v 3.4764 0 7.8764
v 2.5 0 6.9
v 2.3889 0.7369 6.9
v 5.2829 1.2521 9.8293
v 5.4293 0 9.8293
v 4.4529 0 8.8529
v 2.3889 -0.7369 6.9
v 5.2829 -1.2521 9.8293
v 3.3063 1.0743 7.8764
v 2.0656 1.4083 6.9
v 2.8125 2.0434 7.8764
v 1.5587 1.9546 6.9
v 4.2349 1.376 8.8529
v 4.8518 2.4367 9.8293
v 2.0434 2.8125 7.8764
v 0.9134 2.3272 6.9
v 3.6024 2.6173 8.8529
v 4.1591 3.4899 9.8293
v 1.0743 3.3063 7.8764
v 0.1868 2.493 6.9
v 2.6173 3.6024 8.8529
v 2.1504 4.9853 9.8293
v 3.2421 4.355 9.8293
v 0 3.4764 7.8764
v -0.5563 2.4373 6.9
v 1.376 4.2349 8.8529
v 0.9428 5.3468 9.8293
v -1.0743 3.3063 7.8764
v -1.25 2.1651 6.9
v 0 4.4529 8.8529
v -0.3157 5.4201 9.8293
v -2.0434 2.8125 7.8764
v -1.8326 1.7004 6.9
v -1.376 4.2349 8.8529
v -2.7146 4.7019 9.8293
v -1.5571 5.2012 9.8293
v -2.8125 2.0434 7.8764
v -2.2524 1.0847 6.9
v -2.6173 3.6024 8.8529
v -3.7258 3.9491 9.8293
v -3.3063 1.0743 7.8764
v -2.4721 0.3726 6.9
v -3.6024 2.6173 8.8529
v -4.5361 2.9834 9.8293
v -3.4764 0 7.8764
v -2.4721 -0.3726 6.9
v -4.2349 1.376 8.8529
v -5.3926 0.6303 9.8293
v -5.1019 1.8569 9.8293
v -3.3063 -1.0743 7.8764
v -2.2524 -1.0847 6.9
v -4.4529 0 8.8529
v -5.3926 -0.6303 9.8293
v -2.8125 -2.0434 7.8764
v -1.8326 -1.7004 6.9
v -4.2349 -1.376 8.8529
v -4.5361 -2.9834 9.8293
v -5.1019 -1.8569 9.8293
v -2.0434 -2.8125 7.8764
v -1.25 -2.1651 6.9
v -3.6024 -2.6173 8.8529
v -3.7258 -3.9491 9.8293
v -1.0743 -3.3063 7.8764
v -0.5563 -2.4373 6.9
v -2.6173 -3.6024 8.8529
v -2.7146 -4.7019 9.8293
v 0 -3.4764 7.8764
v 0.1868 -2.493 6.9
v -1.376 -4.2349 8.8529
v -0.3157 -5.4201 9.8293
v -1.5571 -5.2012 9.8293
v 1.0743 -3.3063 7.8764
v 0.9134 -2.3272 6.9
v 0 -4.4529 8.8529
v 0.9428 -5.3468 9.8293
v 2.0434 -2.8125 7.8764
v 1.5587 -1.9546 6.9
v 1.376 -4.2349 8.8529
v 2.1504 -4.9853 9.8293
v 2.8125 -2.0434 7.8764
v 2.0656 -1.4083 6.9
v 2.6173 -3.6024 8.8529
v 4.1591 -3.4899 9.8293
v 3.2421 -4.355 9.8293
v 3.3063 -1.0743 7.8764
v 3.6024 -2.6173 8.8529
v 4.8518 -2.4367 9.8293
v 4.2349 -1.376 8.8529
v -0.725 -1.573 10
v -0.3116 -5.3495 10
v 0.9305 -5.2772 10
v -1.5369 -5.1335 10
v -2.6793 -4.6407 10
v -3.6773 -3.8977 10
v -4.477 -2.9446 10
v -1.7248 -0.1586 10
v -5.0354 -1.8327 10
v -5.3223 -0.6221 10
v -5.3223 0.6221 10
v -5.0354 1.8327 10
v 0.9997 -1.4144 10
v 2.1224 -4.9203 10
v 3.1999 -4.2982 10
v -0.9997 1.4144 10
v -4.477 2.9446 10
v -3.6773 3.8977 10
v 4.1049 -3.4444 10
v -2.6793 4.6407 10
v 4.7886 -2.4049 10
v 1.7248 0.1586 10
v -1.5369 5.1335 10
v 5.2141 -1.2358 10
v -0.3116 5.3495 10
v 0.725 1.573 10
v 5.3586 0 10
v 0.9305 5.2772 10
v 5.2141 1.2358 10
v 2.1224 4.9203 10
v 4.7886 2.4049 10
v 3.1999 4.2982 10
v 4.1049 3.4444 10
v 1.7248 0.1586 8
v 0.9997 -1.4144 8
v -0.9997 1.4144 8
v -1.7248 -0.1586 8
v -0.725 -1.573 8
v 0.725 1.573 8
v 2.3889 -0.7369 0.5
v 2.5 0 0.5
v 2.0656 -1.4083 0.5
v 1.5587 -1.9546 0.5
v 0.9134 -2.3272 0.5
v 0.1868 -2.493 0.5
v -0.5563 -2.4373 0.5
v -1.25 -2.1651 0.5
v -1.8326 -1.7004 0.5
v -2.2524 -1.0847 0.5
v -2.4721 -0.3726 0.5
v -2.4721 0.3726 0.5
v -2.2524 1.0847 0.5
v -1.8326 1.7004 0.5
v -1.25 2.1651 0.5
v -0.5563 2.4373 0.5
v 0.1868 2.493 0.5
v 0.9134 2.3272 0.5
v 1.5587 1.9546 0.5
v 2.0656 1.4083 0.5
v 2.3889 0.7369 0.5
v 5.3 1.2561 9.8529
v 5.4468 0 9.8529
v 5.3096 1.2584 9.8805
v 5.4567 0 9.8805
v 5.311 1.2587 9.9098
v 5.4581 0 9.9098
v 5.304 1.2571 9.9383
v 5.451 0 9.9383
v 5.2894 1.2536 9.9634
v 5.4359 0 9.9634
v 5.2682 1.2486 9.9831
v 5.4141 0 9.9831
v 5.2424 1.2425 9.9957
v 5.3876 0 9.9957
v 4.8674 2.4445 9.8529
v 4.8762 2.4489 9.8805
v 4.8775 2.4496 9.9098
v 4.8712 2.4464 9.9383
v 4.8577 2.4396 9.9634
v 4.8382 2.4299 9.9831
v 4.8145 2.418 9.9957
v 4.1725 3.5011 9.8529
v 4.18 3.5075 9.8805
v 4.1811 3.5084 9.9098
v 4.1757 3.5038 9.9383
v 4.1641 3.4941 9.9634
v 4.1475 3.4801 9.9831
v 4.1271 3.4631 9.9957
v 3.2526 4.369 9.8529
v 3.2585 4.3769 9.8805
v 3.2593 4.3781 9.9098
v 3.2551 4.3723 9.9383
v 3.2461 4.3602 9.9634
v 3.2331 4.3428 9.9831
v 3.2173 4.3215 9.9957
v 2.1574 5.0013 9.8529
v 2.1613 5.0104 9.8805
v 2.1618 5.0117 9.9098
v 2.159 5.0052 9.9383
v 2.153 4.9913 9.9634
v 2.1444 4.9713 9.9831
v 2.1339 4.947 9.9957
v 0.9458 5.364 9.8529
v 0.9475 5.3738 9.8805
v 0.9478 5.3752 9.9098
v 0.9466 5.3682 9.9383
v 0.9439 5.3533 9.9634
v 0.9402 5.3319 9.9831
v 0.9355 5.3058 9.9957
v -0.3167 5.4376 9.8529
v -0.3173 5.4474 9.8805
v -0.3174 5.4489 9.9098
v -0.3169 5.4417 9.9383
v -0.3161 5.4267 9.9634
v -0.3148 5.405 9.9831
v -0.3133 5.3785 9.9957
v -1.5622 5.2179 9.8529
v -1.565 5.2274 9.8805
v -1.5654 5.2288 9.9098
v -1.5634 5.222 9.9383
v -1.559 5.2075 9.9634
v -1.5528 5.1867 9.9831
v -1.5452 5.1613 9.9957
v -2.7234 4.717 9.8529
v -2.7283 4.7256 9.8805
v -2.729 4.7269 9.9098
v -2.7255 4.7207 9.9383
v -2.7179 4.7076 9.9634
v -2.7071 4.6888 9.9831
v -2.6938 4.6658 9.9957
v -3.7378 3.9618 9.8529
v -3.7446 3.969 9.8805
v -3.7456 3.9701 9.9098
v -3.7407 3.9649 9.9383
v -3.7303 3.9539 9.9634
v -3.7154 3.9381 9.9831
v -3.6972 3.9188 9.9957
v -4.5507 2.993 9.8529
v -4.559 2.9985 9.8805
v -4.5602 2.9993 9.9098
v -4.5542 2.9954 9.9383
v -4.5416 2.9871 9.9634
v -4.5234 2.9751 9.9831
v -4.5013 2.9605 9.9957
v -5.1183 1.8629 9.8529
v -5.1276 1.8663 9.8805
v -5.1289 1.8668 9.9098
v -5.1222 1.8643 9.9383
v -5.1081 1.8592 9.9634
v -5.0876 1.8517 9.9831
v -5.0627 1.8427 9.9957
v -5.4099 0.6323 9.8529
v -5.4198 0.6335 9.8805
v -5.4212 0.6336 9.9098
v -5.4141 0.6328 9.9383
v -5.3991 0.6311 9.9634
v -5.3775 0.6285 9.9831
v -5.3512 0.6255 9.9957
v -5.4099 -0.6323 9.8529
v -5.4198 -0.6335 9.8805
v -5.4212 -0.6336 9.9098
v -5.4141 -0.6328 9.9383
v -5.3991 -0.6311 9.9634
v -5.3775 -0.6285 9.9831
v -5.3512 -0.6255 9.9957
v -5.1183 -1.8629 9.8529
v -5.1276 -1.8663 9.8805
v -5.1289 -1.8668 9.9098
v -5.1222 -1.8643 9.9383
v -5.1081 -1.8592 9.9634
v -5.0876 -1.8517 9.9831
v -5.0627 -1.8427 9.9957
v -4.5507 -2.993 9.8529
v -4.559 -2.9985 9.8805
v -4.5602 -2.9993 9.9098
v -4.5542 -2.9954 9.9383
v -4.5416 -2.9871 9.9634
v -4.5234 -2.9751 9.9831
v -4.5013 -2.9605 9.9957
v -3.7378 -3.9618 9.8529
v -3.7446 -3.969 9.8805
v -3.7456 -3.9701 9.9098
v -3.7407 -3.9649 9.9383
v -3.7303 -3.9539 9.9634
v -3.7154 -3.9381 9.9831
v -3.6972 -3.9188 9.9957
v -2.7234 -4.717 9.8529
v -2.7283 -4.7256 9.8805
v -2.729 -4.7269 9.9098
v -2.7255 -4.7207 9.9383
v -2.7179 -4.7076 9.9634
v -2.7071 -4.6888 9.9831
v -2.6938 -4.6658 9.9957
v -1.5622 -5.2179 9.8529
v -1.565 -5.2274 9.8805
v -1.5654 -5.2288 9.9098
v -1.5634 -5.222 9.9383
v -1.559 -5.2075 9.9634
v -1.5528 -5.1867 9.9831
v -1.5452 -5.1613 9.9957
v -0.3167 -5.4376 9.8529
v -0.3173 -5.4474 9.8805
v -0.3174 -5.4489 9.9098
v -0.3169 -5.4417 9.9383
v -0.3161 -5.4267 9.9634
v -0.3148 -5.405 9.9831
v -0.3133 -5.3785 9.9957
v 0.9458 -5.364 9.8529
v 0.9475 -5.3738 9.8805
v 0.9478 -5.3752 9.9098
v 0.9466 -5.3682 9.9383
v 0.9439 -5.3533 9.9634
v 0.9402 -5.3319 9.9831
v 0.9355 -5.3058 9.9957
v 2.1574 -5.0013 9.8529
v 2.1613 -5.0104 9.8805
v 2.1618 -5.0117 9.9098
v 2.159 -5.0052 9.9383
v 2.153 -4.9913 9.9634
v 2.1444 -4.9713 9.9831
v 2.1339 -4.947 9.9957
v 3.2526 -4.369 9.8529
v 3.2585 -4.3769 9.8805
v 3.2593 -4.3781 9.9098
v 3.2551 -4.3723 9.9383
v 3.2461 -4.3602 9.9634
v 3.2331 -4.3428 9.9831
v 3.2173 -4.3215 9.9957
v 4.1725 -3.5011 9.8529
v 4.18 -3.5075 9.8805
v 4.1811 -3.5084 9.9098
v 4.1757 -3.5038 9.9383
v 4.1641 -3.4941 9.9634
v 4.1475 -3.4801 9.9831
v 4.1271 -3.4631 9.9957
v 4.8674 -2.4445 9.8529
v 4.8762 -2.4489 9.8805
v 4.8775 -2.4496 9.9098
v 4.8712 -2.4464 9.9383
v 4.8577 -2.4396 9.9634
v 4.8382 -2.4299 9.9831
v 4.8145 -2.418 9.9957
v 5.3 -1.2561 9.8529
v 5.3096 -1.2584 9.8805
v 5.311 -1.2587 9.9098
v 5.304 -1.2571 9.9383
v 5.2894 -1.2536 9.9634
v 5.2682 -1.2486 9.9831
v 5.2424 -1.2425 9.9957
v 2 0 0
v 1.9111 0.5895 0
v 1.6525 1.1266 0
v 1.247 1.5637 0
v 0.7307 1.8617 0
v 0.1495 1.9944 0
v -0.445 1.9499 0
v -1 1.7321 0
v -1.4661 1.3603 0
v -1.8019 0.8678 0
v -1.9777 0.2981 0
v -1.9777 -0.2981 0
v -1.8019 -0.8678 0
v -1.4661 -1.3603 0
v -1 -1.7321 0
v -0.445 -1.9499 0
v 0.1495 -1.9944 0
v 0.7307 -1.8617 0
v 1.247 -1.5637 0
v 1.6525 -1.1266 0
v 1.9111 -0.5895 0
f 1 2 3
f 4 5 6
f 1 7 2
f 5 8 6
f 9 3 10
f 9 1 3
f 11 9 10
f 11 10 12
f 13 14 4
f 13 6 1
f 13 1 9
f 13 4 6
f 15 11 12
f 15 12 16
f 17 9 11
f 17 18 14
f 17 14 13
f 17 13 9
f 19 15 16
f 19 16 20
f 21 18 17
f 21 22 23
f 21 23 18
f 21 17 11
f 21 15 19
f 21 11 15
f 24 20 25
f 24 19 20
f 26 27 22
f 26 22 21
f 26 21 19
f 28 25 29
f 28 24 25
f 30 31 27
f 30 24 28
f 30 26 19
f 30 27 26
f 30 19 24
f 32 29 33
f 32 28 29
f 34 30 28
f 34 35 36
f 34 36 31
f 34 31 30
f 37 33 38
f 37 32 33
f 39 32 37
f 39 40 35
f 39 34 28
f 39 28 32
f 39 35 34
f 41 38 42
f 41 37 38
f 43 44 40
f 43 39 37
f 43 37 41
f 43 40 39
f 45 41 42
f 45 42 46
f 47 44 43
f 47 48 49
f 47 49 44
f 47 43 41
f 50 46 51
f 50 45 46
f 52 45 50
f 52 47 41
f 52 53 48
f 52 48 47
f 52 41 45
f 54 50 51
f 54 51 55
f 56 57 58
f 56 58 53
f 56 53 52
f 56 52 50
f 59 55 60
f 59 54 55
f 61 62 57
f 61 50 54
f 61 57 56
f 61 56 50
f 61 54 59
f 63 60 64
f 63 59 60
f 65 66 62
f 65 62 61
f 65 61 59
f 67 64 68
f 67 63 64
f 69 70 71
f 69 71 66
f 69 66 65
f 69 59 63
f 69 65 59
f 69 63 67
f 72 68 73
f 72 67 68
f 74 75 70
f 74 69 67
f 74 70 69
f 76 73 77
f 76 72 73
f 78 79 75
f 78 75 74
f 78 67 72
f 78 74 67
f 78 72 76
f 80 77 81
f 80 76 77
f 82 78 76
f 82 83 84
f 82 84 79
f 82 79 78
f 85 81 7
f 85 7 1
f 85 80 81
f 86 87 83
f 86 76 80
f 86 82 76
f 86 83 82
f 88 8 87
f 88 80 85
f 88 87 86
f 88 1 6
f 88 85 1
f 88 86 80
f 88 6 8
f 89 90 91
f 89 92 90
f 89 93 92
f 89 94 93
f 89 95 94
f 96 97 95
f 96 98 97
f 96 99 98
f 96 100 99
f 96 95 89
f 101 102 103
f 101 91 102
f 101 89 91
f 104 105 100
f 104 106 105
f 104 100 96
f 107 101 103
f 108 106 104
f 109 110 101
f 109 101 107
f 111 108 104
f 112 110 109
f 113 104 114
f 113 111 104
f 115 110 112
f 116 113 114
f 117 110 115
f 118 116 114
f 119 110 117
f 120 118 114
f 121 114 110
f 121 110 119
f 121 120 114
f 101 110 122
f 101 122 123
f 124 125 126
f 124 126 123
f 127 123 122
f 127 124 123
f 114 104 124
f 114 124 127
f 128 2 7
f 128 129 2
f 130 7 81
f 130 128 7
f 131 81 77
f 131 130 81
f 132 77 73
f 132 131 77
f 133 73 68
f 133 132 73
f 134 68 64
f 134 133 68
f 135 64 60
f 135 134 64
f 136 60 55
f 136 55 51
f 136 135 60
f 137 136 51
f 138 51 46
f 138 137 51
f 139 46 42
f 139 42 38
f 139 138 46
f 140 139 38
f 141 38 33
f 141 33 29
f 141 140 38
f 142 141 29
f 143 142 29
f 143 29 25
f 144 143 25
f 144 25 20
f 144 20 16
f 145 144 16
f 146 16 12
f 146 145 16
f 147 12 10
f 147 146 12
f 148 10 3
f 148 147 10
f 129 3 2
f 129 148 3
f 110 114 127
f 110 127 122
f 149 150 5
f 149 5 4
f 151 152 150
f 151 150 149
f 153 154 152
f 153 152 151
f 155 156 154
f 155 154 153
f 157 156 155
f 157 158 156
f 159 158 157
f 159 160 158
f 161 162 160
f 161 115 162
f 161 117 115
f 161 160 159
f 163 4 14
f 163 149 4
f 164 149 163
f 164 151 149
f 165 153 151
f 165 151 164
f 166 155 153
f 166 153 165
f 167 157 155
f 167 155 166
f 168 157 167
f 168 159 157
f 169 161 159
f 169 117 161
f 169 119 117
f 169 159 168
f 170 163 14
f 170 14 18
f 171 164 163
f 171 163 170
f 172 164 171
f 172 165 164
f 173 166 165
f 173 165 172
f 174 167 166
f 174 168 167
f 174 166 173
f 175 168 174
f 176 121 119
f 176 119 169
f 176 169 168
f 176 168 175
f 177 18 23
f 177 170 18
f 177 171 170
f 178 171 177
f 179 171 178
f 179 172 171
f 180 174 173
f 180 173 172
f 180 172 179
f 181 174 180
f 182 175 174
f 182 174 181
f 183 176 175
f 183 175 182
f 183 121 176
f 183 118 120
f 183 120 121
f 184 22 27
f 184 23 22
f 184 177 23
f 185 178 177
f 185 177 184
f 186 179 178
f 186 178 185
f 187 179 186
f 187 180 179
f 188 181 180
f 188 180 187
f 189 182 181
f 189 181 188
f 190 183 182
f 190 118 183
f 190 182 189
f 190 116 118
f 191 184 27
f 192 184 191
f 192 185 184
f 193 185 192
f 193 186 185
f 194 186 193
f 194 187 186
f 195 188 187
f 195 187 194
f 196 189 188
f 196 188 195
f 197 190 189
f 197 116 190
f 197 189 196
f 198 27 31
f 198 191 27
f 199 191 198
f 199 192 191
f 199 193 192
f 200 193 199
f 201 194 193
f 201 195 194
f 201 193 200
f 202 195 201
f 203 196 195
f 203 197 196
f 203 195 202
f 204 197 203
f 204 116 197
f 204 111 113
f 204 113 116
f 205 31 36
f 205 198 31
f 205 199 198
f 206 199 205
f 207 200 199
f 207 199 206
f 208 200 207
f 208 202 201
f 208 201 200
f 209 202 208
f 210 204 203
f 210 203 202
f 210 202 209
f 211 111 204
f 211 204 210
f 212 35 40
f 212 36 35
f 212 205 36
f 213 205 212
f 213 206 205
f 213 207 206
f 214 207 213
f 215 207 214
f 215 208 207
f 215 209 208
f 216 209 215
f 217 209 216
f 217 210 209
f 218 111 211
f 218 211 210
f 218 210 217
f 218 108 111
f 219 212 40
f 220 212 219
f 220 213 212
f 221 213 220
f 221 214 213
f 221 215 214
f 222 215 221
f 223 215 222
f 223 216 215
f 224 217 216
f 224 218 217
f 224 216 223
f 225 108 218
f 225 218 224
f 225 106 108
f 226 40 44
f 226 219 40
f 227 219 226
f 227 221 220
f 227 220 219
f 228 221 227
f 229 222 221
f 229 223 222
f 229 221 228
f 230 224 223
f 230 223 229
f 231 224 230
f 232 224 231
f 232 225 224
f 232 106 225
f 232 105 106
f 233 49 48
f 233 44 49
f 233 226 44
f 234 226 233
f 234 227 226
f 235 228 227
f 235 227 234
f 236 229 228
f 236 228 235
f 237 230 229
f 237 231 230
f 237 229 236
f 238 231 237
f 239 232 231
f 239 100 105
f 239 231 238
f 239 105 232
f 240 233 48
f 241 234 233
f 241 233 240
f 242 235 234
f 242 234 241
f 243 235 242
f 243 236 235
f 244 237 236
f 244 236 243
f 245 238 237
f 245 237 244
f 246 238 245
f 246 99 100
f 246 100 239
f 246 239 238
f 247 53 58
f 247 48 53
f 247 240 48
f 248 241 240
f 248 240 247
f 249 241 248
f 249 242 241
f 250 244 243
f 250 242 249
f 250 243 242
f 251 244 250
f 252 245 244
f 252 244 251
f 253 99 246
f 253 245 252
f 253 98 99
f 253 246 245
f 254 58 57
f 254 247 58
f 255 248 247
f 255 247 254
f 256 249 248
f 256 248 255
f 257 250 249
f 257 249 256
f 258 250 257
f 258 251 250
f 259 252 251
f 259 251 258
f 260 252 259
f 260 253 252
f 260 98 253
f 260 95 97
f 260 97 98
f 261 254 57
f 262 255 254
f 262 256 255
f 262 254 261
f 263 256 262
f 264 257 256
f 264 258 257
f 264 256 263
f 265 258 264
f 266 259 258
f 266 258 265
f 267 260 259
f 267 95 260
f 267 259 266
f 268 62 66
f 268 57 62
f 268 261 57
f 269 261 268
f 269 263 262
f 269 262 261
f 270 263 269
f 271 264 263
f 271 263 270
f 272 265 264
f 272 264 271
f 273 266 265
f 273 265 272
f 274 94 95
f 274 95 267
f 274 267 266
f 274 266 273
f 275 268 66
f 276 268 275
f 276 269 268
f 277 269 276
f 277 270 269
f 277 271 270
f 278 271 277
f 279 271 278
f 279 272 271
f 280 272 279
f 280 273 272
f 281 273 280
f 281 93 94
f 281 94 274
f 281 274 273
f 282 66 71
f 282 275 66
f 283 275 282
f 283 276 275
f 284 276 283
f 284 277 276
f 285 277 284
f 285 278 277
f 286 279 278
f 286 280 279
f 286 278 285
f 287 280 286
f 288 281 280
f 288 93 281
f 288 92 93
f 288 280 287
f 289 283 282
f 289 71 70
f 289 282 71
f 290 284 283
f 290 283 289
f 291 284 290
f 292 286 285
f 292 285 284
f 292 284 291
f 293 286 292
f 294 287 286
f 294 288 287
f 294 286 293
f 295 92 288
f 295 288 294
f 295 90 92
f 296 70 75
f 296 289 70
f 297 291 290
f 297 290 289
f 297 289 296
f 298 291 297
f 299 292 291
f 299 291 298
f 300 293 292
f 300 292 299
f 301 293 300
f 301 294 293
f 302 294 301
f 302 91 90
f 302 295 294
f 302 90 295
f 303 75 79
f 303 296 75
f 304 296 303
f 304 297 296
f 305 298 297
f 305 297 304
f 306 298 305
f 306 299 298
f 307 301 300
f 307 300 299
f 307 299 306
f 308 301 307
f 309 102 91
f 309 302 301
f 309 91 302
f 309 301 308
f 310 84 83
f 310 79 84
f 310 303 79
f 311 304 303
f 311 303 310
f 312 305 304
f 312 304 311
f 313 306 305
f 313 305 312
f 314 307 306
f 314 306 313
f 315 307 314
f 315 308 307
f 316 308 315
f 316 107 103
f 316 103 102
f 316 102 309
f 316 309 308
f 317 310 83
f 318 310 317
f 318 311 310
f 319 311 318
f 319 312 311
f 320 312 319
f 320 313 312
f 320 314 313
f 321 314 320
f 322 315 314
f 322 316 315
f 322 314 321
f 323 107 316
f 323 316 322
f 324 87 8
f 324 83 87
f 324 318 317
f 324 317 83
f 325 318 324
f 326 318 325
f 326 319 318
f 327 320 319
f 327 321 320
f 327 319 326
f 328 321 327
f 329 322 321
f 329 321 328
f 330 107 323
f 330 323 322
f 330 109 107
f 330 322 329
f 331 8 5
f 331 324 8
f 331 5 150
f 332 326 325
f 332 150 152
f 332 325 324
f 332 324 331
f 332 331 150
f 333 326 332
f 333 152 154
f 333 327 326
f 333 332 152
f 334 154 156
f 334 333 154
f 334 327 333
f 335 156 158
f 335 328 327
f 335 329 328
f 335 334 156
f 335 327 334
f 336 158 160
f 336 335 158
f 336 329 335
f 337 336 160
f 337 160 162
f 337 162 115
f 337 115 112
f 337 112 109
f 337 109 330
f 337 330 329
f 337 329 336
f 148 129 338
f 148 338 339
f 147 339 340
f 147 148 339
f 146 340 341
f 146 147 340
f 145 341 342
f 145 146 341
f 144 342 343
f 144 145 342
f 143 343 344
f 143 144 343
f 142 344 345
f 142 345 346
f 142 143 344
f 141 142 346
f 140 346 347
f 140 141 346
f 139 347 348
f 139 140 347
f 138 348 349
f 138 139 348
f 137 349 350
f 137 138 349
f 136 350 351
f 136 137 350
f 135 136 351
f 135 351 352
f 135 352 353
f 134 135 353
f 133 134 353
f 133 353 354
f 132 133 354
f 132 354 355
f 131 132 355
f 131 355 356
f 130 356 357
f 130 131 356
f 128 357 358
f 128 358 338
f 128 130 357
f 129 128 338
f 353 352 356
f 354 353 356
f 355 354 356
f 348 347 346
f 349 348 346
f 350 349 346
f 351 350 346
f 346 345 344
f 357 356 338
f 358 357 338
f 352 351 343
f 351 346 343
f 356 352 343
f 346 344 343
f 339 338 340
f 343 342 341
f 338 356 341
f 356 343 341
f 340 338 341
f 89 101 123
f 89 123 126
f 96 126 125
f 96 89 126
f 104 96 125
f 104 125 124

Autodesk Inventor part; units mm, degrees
ref_plane "YZ Plane" through (0, 0, 0) normal (1, 0, 0) x (0, 1, 0)
ref_plane "XZ Plane" through (0, 0, 0) normal (0, 1, 0) x (-1, 0, 0)
ref_plane "XY Plane" through (0, 0, 0) normal (0, 0, 1) x (1, 0, 0)
sketch "Sketch1" plane through (0, 0, 0) normal (0, 0, 1) x (1, 0, 0)
  circle A0 centre (0, 0) radius 2.5
  dimension "Diameter" = 5
extrude "Extrusion1" add sketch "Sketch1" along normal blind 6.9
sketch "Sketch2" plane through (0, 0, 6.9) normal (0, 0, 1) x (1, 0, 0)
  circle A0 centre (0, 0) radius 2.5 projected
extrude "Extrusion2" add sketch "Sketch2" along normal blind 3.1 draft 45
sketch "Sketch3" plane through (0, 0, 10) normal (0, 0, 1) x (1, 0, 0)
  circle A0 centre (0, 0) radius 5.6 projected
  circle A1 centre (0, 0) radius 1.7321 construction
  line L0 (0.725, 1.573) -> (1.7248, 0.1586)
  line L1 (1.7248, 0.1586) -> (0.9997, -1.4144)
  line L2 (0.9997, -1.4144) -> (-0.725, -1.573)
  line L3 (-0.725, -1.573) -> (-1.7248, -0.1586)
  line L4 (-1.7248, -0.1586) -> (-0.9997, 1.4144)
  line L5 (-0.9997, 1.4144) -> (0.725, 1.573)
  dimension "Hex_Width" = 3
extrude "Extrusion3" cut sketch "Sketch3" against normal blind 2 contours L0 L1 L2 L3 L4 L5
thread "Thread1" size "M5x0.8" class "4g6g" standard "ANSI Metric M Profile" length 6.9
chamfer "Chamfer2" distance 0.5 angle 45 1 edges at (-2.5, 0, 0)
fillet "Fillet1" radius 0.1 1 edges at (-5.6, 0, 10)
equation "\"d10\" = Thread_Length"
equation "\"d13\" = Chamfer"
equation "\"Thread_Length\" = 6.9"
equation "\"Chamfer\" = 0.5"
properties part number "SCREW, FLAT HD, P, 5, M5X0_8X10MM"
